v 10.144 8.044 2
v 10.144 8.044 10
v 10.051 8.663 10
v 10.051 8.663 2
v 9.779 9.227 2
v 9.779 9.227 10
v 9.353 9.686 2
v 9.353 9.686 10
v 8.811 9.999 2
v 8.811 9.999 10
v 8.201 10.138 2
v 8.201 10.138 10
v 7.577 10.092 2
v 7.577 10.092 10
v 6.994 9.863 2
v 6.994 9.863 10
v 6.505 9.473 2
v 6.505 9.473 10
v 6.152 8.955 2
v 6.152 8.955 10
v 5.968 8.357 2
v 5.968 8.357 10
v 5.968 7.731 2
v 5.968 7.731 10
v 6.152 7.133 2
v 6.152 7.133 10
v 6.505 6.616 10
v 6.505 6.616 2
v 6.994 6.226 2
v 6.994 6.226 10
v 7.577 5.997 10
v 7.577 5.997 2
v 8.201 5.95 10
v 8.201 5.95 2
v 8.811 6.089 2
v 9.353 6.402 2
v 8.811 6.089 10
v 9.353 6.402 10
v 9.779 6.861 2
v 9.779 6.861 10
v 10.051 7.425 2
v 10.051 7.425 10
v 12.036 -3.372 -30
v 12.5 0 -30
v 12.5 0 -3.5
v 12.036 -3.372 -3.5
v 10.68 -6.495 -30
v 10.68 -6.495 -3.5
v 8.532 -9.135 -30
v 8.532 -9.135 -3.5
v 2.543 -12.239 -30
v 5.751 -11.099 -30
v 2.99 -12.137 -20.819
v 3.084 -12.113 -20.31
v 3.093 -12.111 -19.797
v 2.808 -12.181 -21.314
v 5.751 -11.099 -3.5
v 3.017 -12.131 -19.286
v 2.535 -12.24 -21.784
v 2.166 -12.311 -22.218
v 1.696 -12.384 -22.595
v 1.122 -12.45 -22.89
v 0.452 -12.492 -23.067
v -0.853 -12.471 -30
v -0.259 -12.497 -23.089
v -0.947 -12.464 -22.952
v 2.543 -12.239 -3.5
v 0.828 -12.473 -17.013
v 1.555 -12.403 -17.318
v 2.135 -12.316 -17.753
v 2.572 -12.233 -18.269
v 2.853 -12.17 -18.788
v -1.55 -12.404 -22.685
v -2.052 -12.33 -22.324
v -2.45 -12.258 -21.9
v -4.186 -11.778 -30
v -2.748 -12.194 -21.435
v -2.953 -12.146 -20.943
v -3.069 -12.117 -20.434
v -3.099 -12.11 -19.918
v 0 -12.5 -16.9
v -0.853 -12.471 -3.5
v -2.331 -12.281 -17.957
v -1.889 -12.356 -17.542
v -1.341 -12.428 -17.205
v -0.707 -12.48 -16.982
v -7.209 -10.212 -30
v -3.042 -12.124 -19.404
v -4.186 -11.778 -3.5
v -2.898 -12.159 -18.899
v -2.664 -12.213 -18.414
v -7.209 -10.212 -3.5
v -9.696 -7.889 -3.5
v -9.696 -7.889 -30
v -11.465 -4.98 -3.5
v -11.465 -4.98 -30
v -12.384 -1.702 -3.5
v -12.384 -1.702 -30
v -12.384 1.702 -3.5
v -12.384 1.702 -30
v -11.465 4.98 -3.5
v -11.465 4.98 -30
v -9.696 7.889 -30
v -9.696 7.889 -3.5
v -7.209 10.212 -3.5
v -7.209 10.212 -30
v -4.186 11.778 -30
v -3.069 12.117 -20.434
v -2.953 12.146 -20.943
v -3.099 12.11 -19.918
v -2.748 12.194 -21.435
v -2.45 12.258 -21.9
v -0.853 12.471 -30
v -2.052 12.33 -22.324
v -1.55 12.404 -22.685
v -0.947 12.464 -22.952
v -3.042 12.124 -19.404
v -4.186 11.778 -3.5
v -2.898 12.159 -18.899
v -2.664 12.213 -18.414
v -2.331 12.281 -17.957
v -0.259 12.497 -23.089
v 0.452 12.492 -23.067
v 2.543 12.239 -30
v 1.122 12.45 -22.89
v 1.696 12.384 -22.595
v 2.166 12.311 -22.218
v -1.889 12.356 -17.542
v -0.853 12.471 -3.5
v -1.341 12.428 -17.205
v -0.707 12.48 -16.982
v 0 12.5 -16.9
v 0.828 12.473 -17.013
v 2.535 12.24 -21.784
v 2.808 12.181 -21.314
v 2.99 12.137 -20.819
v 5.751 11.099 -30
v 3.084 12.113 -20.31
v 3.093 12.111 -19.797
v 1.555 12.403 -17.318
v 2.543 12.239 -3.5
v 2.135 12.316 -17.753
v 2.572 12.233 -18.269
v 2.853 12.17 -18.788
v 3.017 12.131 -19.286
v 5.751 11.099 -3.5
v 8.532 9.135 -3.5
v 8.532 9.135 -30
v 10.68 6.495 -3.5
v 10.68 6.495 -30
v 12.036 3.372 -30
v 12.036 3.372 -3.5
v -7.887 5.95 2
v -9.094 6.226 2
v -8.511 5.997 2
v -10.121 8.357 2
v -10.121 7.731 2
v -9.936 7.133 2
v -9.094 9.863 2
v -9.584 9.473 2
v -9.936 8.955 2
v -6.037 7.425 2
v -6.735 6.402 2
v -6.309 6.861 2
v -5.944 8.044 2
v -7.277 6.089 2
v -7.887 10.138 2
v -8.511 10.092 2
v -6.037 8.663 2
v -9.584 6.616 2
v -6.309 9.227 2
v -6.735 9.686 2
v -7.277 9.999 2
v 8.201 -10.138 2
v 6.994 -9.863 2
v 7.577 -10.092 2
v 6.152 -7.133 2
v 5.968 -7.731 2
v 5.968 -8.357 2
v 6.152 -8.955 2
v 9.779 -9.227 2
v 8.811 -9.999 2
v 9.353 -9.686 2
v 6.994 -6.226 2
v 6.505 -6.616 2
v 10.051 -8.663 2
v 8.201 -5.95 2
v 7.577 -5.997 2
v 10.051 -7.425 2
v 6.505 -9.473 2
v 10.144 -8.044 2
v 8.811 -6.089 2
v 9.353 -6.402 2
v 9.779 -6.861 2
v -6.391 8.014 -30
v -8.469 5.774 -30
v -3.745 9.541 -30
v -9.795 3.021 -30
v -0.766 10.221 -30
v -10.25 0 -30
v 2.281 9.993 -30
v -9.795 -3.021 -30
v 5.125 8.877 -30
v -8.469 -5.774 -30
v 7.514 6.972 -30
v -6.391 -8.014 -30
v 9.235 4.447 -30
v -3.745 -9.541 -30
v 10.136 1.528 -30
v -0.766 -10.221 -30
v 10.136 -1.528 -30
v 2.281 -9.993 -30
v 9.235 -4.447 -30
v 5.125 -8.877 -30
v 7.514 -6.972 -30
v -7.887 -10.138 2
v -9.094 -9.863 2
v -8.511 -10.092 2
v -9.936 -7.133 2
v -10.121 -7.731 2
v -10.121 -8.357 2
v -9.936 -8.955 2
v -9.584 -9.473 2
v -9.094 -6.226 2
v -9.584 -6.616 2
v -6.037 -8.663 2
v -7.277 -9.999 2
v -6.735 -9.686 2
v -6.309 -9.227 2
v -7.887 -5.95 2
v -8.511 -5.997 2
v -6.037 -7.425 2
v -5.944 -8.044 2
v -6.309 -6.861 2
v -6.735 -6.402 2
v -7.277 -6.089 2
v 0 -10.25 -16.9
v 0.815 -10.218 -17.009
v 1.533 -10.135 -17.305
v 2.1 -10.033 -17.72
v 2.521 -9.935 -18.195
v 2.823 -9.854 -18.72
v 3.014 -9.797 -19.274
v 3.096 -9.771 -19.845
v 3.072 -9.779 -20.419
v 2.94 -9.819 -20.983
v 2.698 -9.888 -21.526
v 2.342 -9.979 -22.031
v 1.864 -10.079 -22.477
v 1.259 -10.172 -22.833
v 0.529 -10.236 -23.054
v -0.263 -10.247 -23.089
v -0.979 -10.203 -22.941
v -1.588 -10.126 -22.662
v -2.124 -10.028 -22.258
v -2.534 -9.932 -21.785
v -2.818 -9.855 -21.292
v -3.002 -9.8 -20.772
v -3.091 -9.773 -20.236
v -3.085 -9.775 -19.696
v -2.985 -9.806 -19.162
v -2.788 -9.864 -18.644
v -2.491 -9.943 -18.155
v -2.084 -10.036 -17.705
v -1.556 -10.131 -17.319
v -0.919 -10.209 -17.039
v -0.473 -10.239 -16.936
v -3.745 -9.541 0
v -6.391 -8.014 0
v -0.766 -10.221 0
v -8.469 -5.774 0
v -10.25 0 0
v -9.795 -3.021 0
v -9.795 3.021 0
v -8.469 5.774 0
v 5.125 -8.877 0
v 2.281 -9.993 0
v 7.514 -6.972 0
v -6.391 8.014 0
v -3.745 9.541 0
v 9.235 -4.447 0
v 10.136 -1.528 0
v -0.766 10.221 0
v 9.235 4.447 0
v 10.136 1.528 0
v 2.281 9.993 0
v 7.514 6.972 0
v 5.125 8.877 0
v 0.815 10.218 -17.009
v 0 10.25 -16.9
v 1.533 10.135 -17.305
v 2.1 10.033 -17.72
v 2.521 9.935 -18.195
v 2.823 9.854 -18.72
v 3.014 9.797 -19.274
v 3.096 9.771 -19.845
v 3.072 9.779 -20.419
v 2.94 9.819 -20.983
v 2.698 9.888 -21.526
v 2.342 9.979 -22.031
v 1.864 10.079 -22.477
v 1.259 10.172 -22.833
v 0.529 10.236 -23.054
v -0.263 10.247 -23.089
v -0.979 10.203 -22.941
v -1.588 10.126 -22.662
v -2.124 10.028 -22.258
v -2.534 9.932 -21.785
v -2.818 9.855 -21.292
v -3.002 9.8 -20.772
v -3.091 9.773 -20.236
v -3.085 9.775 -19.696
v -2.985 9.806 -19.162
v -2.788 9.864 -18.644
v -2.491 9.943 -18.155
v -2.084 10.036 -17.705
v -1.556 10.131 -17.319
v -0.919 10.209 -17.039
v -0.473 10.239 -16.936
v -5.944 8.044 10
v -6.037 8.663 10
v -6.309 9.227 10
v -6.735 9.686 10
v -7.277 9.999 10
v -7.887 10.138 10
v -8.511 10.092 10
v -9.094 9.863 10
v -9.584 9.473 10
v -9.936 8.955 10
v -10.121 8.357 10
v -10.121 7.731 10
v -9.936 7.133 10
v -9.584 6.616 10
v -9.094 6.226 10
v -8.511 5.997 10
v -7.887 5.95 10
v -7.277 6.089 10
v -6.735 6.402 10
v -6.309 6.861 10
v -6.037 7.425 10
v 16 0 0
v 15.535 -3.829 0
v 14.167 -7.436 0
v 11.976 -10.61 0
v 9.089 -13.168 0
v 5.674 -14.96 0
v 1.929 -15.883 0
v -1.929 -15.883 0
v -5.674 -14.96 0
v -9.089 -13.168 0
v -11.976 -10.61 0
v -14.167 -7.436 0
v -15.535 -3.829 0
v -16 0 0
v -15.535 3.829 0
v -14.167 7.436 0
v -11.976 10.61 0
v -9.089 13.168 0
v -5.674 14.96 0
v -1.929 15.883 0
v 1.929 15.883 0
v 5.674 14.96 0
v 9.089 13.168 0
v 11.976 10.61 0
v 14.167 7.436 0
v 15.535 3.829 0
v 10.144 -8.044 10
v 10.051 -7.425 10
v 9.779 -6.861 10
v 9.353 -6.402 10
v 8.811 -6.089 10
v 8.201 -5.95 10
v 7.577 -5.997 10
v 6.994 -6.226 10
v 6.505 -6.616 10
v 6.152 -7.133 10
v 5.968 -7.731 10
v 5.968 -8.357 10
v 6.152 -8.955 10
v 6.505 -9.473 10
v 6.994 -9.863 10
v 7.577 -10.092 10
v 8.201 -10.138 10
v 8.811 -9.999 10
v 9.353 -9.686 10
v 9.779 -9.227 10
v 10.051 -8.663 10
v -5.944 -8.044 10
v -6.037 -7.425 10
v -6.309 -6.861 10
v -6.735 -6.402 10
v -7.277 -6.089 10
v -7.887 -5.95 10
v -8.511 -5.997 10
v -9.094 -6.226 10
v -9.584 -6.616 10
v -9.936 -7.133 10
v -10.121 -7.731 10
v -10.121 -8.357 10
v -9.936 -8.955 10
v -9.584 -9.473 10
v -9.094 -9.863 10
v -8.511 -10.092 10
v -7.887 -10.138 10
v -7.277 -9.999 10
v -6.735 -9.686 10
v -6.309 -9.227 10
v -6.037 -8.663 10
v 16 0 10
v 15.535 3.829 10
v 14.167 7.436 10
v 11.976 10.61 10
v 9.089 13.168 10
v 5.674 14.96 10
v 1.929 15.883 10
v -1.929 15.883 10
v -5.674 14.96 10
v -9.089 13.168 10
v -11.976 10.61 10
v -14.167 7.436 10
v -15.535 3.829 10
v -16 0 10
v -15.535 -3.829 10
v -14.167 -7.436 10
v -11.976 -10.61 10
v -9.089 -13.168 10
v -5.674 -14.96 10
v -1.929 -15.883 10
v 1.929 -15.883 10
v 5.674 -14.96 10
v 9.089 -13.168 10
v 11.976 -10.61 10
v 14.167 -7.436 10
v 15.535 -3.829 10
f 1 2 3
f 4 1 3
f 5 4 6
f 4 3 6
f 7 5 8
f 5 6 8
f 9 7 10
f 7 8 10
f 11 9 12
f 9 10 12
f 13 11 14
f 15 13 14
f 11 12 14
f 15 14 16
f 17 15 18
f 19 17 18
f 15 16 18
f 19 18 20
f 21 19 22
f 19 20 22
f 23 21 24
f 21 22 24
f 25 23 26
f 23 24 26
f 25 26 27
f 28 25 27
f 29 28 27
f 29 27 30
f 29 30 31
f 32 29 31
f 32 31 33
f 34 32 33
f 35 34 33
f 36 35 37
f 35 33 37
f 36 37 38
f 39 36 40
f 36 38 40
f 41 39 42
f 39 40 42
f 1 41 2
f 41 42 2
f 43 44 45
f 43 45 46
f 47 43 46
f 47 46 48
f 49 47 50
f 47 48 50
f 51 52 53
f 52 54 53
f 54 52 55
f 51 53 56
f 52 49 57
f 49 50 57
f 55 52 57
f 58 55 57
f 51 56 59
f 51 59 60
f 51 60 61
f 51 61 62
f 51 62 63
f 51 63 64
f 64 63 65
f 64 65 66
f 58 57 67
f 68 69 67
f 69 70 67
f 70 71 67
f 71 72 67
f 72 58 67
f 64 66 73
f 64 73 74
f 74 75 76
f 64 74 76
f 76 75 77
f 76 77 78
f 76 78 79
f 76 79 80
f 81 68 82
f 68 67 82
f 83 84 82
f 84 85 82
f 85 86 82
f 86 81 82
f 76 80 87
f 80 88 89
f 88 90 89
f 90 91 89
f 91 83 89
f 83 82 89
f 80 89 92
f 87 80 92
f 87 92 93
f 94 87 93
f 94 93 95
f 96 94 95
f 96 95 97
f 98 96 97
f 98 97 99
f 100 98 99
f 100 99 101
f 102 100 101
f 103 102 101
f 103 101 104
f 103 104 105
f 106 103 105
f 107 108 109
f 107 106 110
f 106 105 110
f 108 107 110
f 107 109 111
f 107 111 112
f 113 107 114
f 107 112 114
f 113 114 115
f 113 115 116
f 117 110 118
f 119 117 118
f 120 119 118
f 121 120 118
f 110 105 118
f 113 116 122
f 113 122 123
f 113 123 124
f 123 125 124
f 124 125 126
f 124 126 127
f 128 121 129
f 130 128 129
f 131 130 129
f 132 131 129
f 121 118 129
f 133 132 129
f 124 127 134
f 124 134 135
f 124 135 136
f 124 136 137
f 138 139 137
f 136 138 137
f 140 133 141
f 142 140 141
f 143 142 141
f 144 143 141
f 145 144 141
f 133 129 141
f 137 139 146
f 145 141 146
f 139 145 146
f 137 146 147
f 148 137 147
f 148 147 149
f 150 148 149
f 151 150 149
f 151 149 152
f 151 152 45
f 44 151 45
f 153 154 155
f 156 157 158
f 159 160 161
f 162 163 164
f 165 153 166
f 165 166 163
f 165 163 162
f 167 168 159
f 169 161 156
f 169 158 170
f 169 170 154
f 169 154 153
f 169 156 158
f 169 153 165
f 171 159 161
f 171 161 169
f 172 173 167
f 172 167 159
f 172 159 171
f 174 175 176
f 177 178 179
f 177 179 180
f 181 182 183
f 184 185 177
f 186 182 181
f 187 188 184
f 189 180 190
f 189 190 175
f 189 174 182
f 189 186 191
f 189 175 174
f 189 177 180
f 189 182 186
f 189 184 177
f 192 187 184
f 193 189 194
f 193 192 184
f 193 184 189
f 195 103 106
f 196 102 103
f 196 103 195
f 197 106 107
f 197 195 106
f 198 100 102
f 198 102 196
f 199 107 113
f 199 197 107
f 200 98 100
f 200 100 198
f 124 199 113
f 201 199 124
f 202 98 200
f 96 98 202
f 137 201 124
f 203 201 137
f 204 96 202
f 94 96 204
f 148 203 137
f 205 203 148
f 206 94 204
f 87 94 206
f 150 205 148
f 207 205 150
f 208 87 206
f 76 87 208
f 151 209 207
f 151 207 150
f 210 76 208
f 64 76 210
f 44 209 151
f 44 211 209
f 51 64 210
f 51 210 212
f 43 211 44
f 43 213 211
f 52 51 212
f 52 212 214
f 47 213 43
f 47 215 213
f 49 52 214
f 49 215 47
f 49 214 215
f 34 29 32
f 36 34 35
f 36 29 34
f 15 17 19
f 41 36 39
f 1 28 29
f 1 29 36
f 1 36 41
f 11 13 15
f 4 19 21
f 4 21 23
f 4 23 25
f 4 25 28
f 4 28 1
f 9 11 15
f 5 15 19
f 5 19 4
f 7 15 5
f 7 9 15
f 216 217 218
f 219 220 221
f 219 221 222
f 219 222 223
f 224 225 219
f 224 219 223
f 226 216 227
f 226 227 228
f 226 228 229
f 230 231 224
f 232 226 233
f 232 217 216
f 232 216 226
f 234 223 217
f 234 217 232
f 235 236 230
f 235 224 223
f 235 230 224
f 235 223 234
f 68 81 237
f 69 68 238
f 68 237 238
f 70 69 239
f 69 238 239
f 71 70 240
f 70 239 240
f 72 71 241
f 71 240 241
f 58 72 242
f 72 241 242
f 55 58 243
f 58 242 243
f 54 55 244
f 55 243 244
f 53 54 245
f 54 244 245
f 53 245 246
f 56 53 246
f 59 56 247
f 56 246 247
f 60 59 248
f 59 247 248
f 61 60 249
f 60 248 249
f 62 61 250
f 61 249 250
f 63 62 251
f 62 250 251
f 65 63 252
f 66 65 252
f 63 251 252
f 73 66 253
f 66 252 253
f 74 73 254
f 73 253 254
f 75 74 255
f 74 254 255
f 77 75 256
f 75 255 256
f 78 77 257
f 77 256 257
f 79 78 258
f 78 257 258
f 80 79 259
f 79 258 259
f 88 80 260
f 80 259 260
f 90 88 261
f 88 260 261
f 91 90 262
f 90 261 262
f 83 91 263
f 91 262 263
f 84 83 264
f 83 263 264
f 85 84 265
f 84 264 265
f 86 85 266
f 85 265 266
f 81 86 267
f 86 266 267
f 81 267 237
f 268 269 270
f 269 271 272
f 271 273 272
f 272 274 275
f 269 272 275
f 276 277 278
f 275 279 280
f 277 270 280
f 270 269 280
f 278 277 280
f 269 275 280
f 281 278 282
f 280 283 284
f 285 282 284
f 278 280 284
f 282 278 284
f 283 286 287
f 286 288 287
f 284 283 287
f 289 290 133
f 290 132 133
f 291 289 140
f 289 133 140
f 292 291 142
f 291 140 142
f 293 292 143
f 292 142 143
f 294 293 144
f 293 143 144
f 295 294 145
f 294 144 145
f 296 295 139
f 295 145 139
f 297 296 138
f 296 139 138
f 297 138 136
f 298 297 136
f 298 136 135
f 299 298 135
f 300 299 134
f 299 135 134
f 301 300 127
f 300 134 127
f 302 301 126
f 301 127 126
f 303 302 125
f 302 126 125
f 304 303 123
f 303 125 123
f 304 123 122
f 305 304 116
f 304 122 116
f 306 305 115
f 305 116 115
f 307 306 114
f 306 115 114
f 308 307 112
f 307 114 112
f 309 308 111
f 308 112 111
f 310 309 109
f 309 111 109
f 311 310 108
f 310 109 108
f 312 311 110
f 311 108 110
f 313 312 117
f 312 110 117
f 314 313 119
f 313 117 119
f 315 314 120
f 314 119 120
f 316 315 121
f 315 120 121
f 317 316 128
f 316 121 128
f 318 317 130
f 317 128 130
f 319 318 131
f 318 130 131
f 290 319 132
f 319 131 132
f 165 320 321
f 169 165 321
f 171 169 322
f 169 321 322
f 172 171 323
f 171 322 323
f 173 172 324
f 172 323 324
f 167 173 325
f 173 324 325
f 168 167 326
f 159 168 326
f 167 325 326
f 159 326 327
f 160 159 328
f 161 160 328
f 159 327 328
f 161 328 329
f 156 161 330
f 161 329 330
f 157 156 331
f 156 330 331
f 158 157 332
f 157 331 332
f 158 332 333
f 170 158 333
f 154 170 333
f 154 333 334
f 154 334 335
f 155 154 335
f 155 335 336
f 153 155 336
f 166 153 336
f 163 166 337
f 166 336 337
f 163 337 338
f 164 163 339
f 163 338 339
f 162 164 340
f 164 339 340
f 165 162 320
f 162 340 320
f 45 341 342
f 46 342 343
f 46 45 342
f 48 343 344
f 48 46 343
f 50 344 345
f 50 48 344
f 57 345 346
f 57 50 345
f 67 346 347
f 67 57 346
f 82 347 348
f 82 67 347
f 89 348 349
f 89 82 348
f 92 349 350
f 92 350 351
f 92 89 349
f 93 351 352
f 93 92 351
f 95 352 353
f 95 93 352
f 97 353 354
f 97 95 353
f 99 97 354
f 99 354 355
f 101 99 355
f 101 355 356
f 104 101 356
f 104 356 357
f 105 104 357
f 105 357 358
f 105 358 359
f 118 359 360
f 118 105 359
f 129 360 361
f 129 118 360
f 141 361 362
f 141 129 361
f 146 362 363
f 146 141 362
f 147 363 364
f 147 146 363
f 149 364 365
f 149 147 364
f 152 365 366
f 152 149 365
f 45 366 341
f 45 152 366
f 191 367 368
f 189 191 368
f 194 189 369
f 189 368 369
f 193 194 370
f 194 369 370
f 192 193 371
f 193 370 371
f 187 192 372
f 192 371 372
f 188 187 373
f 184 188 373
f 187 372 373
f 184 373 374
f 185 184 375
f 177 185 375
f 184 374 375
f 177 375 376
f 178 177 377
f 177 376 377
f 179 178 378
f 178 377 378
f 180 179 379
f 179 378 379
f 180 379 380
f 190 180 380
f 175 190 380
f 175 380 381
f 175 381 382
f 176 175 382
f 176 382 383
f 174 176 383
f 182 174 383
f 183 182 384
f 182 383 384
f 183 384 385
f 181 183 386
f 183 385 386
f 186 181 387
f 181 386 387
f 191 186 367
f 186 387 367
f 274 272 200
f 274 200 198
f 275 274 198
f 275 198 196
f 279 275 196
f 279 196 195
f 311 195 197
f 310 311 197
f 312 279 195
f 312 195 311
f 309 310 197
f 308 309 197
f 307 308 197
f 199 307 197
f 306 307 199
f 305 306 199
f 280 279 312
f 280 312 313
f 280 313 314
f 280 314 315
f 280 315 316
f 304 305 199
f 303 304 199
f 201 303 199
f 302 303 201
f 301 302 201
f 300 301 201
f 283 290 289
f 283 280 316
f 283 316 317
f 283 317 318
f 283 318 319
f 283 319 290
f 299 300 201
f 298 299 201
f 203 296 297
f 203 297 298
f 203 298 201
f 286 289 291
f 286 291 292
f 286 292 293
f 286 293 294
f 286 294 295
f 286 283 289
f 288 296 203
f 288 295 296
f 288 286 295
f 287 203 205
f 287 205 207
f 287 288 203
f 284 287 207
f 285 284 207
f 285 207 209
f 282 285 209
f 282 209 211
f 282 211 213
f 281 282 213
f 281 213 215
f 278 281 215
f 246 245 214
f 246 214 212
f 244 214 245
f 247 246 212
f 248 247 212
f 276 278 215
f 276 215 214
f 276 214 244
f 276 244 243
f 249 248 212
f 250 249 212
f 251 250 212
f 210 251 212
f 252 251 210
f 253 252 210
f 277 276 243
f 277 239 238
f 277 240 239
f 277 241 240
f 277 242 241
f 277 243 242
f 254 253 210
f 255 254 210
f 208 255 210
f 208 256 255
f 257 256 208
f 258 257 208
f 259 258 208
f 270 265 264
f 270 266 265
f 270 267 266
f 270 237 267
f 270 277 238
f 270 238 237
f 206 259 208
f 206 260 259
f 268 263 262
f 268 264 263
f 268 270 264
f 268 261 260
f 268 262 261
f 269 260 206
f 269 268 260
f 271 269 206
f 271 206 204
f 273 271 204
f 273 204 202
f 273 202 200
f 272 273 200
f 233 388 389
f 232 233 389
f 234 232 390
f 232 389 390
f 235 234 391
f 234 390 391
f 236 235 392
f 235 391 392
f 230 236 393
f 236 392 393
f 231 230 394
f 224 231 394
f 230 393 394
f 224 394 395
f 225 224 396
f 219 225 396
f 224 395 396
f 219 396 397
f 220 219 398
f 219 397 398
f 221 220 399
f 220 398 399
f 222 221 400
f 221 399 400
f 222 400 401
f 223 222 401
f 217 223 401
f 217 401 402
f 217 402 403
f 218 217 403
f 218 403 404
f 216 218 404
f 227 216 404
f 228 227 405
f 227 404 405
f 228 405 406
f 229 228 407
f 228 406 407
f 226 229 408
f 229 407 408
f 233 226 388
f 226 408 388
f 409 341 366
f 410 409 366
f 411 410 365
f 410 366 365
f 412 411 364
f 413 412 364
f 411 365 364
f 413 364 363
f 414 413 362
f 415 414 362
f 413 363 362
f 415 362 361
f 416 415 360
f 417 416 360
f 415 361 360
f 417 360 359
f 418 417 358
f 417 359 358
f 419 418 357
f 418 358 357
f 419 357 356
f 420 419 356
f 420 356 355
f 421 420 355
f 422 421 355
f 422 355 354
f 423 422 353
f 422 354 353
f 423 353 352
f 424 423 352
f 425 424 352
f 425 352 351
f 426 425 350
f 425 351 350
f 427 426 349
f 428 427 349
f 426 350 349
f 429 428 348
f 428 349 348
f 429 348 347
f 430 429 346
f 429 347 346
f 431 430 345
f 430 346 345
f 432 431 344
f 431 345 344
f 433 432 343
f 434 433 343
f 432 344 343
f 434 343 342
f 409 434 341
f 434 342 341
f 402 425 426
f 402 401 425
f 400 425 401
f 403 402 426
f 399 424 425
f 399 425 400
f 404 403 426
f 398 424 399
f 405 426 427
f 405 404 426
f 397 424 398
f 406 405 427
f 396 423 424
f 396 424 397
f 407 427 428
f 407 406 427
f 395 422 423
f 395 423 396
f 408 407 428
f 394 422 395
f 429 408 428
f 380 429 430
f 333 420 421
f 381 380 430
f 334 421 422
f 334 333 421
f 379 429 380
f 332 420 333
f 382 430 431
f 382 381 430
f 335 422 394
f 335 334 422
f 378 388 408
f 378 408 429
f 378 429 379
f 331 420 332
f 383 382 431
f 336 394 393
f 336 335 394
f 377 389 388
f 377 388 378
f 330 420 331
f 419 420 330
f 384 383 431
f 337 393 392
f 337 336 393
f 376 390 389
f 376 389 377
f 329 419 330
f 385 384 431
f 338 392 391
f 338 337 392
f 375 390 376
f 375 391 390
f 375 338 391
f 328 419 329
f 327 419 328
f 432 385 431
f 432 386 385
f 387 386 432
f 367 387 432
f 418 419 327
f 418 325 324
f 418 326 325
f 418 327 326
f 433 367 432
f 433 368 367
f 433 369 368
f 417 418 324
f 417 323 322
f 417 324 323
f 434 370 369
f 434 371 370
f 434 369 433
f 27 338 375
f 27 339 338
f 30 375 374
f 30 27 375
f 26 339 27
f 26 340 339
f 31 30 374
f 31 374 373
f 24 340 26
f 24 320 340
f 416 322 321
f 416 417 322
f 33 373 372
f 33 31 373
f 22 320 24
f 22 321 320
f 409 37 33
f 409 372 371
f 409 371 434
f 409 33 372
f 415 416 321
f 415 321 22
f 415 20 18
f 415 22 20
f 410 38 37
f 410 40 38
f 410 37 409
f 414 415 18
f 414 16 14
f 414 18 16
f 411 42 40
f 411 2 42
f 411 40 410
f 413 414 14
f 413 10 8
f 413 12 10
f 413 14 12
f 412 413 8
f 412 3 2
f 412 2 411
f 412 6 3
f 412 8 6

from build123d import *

# Parameters (mm, degrees)
SKETCH_1_R          = 16
EXTRUDE_1_DEPTH     = 10
SKETCH_2_R          = 12.5
SKETCH_2_R_2        = 10.25
EXTRUDE_2_DEPTH     = 30
SKETCH_3_R          = 2.1
CUT_EXTRUDE_1_DEPTH = 8
SKETCH_5_R          = 3.1
CUT_EXTRUDE_2_DEPTH = 15
CHAMFER_1_SIZE      = 3.5


with BuildPart() as part:
    # 草图1 → 凸台-拉伸1 (new body)
    with BuildSketch(Plane.XY):
        Circle(SKETCH_1_R)
    extrude(amount=EXTRUDE_1_DEPTH)

    # 草图2 → 凸台-拉伸2 (add)
    with BuildSketch(Plane(origin=(0, 0, 0), x_dir=(-1, 0, 0), z_dir=(0, 0, -1))):
        with Locations(Location((0, 0, 0), (0, 0, 180))):
            Circle(SKETCH_2_R)
        Circle(SKETCH_2_R_2, mode=Mode.SUBTRACT)
    extrude(amount=EXTRUDE_2_DEPTH)

    # 草图3 → 切除-拉伸1 (cut)
    with BuildSketch(Plane.XY.offset(10)):
        with Locations((-8.044168072, 8.044168072)):
            Circle(SKETCH_3_R)
        with Locations((8.044168072, 8.044168072)):
            Circle(SKETCH_3_R)
        with Locations((8.044168072, -8.044168072)):
            Circle(SKETCH_3_R)
        with Locations((-8.044168072, -8.044168072)):
            Circle(SKETCH_3_R)
    extrude(amount=-CUT_EXTRUDE_1_DEPTH, mode=Mode.SUBTRACT)

    # 草图5 → 切除-拉伸2 (cut, symmetric)
    with BuildSketch(Plane(origin=(0, 0, 0), x_dir=(1, 0, 0), z_dir=(0, 1, 0))):
        with Locations(Location((0, 20, 0), (0, 0, 270))):
            Circle(SKETCH_5_R)
    extrude(amount=CUT_EXTRUDE_2_DEPTH, both=True, mode=Mode.SUBTRACT)

    # 倒角1
    chamfer_1_edges = [part.edges().sort_by_distance(p)[0] for p in [
        (-12.5, 0, 0),
    ]]
    chamfer(chamfer_1_edges, length=CHAMFER_1_SIZE - 0.0001)  # a hair under: the kernel refuses the full size


solid = part.part
